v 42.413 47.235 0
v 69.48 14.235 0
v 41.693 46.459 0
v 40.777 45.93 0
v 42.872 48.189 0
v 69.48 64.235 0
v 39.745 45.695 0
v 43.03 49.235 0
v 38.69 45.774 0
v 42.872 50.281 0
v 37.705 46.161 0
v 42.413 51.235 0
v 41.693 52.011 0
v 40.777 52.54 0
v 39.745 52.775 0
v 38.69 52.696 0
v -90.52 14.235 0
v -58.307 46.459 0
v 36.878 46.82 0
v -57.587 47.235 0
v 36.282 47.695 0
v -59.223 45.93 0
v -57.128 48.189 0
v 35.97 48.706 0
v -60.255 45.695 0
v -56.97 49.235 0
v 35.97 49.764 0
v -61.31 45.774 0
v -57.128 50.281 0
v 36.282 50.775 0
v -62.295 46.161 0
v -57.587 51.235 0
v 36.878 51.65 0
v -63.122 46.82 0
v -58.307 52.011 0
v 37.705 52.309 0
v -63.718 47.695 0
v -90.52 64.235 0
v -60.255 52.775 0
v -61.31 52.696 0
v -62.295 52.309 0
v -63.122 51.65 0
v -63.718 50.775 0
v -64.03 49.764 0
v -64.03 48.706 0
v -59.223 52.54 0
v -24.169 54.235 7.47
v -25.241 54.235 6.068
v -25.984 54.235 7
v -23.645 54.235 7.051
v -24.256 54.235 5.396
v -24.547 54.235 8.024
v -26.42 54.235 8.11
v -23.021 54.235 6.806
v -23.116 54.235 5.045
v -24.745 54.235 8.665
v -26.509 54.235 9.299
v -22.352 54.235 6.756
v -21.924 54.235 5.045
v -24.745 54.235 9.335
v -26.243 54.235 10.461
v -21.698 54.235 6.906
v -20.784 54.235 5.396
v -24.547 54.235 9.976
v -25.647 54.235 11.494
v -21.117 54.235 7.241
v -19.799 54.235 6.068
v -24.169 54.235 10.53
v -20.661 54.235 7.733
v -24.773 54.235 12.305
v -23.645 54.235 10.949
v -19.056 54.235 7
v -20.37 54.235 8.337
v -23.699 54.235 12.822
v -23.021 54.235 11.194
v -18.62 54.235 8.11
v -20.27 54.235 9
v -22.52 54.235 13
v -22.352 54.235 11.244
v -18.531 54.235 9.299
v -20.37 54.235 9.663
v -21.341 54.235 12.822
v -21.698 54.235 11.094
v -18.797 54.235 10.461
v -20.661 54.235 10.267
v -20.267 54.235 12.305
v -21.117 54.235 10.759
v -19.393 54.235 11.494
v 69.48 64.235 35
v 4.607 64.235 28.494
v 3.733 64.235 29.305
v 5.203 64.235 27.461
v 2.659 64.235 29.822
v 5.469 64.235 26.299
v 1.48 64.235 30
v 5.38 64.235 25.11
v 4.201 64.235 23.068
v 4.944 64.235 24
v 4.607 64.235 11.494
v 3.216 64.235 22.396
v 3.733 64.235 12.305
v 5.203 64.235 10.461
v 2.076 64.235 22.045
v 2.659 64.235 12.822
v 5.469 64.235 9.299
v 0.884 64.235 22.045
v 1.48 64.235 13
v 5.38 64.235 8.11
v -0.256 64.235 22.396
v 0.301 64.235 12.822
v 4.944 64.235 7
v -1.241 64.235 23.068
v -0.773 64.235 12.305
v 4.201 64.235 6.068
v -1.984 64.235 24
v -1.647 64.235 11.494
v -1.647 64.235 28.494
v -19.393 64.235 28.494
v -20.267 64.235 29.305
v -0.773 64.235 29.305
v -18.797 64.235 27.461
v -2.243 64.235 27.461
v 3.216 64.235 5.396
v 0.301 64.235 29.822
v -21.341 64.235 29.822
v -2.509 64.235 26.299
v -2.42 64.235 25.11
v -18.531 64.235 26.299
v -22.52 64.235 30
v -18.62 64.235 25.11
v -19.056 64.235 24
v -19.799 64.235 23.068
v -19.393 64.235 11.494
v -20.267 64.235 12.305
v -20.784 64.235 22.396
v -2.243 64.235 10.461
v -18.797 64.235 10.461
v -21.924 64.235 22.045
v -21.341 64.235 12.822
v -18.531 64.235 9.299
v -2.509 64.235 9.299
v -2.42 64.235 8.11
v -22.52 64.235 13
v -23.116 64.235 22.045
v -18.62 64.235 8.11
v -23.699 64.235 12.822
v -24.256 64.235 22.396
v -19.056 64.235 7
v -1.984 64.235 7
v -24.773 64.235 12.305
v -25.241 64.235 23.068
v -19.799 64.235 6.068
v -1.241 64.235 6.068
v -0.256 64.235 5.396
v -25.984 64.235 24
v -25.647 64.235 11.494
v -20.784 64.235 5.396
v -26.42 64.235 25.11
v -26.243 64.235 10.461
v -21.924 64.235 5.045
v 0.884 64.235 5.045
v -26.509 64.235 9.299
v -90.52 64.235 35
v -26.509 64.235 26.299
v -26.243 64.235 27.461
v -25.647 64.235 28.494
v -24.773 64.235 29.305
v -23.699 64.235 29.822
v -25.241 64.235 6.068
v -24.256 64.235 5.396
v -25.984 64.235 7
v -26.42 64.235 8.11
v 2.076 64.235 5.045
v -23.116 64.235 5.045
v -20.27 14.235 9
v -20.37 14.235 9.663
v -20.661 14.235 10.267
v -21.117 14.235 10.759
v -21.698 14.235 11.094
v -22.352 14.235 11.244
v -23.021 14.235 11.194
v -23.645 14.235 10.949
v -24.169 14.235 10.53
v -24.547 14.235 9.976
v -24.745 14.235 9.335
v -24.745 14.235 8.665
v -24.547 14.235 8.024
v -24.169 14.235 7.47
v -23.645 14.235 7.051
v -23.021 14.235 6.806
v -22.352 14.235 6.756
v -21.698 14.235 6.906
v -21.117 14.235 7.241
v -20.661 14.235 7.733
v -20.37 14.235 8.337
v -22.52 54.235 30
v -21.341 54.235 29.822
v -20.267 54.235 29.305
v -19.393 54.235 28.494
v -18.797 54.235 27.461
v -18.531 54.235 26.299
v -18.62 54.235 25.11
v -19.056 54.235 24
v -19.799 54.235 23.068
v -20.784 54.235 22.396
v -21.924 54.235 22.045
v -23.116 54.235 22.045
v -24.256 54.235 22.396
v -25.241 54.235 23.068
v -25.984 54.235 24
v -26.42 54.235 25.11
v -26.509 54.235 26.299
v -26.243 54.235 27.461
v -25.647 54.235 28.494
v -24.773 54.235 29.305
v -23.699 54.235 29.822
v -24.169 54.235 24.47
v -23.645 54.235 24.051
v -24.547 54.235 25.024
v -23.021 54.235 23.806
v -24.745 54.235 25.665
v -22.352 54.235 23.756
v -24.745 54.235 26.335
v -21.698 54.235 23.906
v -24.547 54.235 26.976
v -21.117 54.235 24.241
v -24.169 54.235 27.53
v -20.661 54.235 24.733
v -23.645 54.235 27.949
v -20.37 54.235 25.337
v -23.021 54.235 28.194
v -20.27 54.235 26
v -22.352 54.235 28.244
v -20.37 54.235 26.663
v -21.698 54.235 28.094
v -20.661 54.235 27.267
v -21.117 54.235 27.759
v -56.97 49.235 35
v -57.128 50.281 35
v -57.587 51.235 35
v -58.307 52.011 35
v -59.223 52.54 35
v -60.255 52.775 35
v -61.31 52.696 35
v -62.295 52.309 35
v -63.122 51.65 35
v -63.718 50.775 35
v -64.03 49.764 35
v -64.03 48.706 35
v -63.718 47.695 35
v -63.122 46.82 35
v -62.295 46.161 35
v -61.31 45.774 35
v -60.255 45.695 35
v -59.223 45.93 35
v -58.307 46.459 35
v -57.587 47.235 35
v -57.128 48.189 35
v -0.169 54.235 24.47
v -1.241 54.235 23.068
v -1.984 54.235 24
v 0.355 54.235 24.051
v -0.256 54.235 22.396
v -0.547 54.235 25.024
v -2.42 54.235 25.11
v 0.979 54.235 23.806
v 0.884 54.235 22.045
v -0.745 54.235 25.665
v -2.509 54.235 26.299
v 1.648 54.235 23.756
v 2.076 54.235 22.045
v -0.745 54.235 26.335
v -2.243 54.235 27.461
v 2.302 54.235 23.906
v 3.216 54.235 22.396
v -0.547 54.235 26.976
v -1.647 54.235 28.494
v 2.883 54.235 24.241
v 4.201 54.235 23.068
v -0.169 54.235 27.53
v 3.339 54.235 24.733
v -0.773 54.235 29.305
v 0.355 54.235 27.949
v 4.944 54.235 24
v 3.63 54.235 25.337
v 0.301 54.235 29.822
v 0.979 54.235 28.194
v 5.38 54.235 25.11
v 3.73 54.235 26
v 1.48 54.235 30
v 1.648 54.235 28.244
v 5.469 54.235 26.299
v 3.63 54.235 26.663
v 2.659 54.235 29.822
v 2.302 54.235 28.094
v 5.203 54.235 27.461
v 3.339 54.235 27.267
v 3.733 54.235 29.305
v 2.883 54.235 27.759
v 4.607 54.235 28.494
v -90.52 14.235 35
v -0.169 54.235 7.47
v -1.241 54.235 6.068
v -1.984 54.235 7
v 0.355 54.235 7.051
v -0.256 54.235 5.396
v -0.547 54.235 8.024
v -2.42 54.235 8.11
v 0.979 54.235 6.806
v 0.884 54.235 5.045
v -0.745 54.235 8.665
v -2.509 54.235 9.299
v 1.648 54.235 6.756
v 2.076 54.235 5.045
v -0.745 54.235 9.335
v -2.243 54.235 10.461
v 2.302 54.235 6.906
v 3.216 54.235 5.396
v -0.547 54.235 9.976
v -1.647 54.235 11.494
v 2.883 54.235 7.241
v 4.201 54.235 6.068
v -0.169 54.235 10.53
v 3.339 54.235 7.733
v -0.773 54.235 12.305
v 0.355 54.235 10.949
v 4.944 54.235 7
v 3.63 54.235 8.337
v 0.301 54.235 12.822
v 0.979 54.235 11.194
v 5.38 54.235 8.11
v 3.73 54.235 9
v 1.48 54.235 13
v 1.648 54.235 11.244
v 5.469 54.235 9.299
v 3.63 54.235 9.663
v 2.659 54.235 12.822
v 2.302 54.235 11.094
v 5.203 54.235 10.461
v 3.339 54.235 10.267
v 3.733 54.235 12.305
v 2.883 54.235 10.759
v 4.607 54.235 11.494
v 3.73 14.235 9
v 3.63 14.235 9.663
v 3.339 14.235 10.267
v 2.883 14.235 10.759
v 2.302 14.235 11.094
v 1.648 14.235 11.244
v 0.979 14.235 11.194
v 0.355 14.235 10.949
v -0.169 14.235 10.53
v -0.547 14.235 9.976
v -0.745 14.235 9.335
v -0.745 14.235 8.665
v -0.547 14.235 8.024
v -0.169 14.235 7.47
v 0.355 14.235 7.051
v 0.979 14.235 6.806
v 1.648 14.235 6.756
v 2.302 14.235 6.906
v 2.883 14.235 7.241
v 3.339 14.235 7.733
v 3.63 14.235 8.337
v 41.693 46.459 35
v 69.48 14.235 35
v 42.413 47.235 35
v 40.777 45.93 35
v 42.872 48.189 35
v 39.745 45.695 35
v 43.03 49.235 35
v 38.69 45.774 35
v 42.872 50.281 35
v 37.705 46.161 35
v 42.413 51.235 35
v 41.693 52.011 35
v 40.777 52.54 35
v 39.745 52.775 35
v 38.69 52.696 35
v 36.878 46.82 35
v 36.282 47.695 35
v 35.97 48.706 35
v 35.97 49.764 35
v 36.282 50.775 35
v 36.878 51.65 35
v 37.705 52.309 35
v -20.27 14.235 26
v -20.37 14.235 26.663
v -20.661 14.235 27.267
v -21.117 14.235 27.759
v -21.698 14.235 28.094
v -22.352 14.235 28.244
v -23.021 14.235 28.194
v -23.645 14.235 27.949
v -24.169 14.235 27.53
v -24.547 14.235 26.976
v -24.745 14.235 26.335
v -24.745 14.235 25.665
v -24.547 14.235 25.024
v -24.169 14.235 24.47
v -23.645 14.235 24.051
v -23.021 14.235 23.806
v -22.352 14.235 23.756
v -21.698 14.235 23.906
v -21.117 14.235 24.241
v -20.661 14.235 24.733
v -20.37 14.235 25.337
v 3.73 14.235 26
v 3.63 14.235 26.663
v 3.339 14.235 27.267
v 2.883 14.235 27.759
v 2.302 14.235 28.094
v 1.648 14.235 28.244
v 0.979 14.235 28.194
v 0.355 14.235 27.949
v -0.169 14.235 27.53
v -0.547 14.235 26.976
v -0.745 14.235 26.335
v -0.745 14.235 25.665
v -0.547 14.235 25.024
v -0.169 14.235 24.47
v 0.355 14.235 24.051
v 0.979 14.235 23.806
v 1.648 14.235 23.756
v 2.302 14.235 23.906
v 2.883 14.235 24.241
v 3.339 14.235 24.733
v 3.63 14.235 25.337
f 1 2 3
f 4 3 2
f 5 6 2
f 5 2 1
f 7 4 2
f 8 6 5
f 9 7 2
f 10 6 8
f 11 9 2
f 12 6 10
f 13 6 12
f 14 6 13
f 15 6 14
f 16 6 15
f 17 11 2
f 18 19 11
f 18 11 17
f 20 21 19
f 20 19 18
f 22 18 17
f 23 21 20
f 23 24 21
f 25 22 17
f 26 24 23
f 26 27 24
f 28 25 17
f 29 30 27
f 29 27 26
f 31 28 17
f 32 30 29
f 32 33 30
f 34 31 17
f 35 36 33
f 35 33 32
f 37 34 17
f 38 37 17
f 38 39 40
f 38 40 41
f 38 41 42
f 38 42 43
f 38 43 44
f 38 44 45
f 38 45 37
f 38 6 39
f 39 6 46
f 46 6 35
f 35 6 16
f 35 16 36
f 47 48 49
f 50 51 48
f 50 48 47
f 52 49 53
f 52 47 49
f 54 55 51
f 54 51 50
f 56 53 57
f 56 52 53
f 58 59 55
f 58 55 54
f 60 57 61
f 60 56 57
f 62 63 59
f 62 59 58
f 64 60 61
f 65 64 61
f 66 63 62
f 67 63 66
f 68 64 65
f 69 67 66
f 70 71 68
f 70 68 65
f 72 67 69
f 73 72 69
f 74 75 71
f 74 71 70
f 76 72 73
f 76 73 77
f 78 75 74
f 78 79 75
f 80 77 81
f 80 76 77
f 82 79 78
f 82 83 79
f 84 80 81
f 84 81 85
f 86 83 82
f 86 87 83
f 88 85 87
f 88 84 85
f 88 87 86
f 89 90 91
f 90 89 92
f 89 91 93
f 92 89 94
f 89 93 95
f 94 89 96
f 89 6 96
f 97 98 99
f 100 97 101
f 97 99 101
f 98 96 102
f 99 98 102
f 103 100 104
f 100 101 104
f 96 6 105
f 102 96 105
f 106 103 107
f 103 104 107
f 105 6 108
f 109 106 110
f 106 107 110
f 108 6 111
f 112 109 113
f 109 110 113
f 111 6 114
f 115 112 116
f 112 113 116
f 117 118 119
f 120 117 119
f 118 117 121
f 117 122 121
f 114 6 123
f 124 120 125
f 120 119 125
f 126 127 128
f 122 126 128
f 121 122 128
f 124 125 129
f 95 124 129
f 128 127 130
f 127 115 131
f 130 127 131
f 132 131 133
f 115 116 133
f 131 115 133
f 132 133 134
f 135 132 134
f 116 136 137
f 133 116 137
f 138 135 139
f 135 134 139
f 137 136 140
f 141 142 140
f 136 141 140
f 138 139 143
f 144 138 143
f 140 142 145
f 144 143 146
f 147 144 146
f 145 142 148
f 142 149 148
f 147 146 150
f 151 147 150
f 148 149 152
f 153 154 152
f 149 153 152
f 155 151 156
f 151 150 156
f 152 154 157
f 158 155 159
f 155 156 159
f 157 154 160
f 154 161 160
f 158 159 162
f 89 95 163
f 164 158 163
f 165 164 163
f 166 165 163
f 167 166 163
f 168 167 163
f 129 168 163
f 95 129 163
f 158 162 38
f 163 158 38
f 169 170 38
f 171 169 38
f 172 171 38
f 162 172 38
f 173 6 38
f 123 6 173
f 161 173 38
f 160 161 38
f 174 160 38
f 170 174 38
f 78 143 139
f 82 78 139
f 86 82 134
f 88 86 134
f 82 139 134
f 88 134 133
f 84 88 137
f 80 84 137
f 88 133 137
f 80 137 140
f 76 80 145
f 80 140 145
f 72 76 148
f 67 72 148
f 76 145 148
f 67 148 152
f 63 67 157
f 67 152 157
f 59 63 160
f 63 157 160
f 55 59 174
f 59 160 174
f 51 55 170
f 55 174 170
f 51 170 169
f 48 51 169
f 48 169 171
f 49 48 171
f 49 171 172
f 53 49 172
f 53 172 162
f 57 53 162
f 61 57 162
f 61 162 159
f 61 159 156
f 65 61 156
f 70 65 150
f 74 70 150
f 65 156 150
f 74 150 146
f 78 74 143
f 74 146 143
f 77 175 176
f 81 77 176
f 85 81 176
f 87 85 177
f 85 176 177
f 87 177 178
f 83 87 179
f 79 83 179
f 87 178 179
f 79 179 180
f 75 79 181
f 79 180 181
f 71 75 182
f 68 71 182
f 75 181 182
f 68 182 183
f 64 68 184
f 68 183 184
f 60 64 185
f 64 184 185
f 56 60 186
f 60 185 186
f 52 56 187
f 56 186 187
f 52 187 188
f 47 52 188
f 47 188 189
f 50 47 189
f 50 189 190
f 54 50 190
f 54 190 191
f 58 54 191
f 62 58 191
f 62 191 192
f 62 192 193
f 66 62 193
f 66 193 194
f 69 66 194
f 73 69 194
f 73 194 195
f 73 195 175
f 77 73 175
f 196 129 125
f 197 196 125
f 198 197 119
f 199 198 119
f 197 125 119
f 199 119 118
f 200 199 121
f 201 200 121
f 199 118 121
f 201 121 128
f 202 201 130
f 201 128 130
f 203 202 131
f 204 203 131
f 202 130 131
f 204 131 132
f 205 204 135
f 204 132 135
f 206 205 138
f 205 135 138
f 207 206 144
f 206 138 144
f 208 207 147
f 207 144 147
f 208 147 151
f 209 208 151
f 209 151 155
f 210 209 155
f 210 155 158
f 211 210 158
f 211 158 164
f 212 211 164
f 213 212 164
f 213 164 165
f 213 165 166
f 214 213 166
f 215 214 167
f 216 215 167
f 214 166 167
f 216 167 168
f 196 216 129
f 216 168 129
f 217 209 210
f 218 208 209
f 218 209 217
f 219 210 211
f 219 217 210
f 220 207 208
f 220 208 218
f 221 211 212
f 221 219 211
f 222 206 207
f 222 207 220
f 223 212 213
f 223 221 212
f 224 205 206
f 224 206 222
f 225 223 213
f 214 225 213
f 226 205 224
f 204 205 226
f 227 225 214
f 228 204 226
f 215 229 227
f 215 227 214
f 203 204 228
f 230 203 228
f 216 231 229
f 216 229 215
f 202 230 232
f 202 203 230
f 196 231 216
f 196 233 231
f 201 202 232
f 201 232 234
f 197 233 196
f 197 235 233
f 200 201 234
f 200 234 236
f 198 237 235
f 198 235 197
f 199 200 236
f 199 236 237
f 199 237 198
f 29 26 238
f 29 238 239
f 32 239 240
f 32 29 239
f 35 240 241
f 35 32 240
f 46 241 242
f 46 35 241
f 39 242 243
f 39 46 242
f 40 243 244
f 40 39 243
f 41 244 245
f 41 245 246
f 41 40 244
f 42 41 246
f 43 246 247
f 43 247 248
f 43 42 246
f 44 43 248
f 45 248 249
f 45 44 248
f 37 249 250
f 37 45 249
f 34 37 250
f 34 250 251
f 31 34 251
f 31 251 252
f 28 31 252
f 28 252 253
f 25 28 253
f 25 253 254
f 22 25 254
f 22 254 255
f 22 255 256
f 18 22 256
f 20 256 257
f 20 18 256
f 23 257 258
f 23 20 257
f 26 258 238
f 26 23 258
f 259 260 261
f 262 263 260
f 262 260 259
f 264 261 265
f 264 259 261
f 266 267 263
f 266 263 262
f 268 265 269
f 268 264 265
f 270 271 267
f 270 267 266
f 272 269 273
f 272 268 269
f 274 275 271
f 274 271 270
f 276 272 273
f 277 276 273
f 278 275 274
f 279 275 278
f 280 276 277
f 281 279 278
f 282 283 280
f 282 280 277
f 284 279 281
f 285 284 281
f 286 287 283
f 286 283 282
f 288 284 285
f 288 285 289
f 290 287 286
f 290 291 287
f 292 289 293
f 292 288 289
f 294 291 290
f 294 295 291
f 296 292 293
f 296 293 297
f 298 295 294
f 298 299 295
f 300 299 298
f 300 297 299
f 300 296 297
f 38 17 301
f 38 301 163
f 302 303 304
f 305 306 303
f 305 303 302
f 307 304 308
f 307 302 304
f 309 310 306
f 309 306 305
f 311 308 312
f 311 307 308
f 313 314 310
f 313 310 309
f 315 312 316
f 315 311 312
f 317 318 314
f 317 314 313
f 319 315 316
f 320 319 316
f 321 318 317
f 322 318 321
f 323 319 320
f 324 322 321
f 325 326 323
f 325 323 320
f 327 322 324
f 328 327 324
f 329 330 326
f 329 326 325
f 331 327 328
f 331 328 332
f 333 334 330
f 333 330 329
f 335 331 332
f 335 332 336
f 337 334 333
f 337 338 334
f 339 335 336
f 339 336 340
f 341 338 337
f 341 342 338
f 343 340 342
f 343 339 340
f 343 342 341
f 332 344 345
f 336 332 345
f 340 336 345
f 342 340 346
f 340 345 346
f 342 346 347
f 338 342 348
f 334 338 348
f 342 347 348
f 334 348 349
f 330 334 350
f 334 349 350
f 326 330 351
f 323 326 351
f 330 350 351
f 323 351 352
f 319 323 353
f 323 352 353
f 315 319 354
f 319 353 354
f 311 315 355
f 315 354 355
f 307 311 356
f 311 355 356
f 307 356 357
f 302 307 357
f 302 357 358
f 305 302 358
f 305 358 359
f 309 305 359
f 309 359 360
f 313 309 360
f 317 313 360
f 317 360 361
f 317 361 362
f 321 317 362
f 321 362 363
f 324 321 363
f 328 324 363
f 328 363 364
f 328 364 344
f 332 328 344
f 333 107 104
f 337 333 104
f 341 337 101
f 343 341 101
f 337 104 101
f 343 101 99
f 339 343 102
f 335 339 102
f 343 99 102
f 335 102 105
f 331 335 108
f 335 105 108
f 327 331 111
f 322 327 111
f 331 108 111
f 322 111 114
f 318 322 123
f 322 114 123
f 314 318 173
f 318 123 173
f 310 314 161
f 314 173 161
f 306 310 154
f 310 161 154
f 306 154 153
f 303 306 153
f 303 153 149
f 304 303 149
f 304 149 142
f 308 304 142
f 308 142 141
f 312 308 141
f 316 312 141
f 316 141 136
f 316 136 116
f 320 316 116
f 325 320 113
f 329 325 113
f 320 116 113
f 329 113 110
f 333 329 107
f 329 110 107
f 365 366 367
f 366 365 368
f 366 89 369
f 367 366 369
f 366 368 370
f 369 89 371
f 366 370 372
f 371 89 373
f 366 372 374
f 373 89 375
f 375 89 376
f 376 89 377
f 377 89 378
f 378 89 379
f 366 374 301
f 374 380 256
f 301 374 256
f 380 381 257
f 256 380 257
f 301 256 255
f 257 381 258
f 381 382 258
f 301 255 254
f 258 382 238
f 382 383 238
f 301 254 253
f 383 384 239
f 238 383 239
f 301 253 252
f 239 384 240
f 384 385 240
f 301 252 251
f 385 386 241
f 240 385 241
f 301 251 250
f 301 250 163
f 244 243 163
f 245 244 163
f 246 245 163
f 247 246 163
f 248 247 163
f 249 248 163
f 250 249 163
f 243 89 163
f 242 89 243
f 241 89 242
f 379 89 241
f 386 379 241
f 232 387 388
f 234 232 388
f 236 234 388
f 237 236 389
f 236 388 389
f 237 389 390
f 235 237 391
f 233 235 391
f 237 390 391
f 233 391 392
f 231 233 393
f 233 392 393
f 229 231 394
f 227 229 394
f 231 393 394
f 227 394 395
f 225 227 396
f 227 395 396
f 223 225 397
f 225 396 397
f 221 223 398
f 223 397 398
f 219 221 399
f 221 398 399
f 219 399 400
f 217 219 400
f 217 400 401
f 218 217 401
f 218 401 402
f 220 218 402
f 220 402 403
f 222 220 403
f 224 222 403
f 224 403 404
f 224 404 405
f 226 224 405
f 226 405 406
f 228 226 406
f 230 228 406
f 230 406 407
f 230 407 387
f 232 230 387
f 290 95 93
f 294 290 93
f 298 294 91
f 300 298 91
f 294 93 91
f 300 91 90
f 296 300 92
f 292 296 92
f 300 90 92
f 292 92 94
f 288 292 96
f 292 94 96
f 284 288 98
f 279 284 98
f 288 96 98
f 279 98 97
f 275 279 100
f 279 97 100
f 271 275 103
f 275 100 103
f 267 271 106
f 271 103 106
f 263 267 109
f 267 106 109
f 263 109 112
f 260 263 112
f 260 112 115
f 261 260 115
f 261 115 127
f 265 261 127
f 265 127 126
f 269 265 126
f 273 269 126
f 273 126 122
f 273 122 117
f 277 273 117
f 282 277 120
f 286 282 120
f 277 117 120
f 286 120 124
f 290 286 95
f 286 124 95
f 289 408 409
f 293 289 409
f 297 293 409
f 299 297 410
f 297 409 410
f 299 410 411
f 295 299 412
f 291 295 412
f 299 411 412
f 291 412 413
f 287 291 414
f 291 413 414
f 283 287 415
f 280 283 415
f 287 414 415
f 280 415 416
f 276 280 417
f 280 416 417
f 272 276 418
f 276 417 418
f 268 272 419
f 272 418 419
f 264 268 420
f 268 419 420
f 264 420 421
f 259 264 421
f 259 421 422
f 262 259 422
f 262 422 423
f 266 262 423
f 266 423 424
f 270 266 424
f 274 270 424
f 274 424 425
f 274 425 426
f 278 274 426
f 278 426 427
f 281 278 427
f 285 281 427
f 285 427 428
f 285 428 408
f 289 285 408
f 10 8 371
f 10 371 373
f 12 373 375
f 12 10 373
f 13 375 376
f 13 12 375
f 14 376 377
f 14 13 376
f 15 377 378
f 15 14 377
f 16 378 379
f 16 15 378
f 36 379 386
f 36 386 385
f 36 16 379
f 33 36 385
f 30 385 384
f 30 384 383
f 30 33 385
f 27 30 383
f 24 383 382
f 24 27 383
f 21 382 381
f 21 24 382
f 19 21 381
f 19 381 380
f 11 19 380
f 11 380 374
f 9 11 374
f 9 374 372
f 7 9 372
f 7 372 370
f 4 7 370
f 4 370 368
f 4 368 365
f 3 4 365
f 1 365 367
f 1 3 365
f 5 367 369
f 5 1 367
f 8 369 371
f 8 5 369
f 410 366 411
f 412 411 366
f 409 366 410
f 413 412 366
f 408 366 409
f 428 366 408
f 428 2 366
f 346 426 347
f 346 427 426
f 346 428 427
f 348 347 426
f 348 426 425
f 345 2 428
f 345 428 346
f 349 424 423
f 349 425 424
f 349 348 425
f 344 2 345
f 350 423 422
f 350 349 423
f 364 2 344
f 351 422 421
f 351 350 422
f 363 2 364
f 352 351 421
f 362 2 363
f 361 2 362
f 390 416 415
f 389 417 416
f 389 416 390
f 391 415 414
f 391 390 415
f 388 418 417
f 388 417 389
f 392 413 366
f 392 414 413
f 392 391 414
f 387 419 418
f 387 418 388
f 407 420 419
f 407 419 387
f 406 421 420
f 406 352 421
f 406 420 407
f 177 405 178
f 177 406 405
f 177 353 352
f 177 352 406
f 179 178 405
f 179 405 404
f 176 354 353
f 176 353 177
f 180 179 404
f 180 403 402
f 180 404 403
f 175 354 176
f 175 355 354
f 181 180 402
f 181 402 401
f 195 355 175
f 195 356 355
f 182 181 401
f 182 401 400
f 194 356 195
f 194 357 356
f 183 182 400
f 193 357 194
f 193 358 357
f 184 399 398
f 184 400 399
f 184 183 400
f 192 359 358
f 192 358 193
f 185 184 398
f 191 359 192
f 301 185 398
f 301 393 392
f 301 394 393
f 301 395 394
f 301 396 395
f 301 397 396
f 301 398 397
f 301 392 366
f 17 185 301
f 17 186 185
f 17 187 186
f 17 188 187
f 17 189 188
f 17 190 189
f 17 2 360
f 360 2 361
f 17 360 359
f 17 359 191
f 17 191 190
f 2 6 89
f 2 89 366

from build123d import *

# Parameters (mm, degrees)
SKETCH2_R           = 3.55
BOSS_EXTRUDE1_DEPTH = 35
SKETCH3_R           = 2.25
CUT_EXTRUDE1_DEPTH  = 110.173579221
SKETCH5_R           = 4
CUT_EXTRUDE3_DEPTH  = 10


with BuildPart() as part:
    # Sketch2 → Boss-Extrude1 (new body)
    with BuildSketch(Plane.XY):
        Polygon((-90.52, 14.235), (-90.52, 64.235), (-25.52, 64.235), (4.48, 64.235), (69.48, 64.235), (69.48, 14.235), align=None)
        with Locations((-60.52, 49.235)):
            Circle(SKETCH2_R, mode=Mode.SUBTRACT)
        with Locations((39.48, 49.235)):
            Circle(SKETCH2_R, mode=Mode.SUBTRACT)
    extrude(amount=BOSS_EXTRUDE1_DEPTH)

    # Sketch3 → Cut-Extrude1 (cut, through all)
    with BuildSketch(Plane.XZ.offset(-14.235)):
        with Locations((-22.52, 26)):
            Circle(SKETCH3_R)
        with Locations((1.48, 26)):
            Circle(SKETCH3_R)
        with Locations((-22.52, 9)):
            Circle(SKETCH3_R)
        with Locations((1.48, 9)):
            Circle(SKETCH3_R)
    extrude(amount=-CUT_EXTRUDE1_DEPTH, mode=Mode.SUBTRACT)

    # Sketch5 → Cut-Extrude3 (cut)
    with BuildSketch(Plane(origin=(0, 64.235, 0), x_dir=(1, 0, 0), z_dir=(0, 1, 0))):
        with Locations(Location((-22.52, -9, 0), (0, 0, 270))):
            Circle(SKETCH5_R)
        with Locations(Location((-22.52, -26, 0), (0, 0, 270))):
            Circle(SKETCH5_R)
        with Locations(Location((1.48, -26, 0), (0, 0, 270))):
            Circle(SKETCH5_R)
        with Locations(Location((1.48, -9, 0), (0, 0, 270))):
            Circle(SKETCH5_R)
    extrude(amount=-CUT_EXTRUDE3_DEPTH, mode=Mode.SUBTRACT)


solid = part.part
